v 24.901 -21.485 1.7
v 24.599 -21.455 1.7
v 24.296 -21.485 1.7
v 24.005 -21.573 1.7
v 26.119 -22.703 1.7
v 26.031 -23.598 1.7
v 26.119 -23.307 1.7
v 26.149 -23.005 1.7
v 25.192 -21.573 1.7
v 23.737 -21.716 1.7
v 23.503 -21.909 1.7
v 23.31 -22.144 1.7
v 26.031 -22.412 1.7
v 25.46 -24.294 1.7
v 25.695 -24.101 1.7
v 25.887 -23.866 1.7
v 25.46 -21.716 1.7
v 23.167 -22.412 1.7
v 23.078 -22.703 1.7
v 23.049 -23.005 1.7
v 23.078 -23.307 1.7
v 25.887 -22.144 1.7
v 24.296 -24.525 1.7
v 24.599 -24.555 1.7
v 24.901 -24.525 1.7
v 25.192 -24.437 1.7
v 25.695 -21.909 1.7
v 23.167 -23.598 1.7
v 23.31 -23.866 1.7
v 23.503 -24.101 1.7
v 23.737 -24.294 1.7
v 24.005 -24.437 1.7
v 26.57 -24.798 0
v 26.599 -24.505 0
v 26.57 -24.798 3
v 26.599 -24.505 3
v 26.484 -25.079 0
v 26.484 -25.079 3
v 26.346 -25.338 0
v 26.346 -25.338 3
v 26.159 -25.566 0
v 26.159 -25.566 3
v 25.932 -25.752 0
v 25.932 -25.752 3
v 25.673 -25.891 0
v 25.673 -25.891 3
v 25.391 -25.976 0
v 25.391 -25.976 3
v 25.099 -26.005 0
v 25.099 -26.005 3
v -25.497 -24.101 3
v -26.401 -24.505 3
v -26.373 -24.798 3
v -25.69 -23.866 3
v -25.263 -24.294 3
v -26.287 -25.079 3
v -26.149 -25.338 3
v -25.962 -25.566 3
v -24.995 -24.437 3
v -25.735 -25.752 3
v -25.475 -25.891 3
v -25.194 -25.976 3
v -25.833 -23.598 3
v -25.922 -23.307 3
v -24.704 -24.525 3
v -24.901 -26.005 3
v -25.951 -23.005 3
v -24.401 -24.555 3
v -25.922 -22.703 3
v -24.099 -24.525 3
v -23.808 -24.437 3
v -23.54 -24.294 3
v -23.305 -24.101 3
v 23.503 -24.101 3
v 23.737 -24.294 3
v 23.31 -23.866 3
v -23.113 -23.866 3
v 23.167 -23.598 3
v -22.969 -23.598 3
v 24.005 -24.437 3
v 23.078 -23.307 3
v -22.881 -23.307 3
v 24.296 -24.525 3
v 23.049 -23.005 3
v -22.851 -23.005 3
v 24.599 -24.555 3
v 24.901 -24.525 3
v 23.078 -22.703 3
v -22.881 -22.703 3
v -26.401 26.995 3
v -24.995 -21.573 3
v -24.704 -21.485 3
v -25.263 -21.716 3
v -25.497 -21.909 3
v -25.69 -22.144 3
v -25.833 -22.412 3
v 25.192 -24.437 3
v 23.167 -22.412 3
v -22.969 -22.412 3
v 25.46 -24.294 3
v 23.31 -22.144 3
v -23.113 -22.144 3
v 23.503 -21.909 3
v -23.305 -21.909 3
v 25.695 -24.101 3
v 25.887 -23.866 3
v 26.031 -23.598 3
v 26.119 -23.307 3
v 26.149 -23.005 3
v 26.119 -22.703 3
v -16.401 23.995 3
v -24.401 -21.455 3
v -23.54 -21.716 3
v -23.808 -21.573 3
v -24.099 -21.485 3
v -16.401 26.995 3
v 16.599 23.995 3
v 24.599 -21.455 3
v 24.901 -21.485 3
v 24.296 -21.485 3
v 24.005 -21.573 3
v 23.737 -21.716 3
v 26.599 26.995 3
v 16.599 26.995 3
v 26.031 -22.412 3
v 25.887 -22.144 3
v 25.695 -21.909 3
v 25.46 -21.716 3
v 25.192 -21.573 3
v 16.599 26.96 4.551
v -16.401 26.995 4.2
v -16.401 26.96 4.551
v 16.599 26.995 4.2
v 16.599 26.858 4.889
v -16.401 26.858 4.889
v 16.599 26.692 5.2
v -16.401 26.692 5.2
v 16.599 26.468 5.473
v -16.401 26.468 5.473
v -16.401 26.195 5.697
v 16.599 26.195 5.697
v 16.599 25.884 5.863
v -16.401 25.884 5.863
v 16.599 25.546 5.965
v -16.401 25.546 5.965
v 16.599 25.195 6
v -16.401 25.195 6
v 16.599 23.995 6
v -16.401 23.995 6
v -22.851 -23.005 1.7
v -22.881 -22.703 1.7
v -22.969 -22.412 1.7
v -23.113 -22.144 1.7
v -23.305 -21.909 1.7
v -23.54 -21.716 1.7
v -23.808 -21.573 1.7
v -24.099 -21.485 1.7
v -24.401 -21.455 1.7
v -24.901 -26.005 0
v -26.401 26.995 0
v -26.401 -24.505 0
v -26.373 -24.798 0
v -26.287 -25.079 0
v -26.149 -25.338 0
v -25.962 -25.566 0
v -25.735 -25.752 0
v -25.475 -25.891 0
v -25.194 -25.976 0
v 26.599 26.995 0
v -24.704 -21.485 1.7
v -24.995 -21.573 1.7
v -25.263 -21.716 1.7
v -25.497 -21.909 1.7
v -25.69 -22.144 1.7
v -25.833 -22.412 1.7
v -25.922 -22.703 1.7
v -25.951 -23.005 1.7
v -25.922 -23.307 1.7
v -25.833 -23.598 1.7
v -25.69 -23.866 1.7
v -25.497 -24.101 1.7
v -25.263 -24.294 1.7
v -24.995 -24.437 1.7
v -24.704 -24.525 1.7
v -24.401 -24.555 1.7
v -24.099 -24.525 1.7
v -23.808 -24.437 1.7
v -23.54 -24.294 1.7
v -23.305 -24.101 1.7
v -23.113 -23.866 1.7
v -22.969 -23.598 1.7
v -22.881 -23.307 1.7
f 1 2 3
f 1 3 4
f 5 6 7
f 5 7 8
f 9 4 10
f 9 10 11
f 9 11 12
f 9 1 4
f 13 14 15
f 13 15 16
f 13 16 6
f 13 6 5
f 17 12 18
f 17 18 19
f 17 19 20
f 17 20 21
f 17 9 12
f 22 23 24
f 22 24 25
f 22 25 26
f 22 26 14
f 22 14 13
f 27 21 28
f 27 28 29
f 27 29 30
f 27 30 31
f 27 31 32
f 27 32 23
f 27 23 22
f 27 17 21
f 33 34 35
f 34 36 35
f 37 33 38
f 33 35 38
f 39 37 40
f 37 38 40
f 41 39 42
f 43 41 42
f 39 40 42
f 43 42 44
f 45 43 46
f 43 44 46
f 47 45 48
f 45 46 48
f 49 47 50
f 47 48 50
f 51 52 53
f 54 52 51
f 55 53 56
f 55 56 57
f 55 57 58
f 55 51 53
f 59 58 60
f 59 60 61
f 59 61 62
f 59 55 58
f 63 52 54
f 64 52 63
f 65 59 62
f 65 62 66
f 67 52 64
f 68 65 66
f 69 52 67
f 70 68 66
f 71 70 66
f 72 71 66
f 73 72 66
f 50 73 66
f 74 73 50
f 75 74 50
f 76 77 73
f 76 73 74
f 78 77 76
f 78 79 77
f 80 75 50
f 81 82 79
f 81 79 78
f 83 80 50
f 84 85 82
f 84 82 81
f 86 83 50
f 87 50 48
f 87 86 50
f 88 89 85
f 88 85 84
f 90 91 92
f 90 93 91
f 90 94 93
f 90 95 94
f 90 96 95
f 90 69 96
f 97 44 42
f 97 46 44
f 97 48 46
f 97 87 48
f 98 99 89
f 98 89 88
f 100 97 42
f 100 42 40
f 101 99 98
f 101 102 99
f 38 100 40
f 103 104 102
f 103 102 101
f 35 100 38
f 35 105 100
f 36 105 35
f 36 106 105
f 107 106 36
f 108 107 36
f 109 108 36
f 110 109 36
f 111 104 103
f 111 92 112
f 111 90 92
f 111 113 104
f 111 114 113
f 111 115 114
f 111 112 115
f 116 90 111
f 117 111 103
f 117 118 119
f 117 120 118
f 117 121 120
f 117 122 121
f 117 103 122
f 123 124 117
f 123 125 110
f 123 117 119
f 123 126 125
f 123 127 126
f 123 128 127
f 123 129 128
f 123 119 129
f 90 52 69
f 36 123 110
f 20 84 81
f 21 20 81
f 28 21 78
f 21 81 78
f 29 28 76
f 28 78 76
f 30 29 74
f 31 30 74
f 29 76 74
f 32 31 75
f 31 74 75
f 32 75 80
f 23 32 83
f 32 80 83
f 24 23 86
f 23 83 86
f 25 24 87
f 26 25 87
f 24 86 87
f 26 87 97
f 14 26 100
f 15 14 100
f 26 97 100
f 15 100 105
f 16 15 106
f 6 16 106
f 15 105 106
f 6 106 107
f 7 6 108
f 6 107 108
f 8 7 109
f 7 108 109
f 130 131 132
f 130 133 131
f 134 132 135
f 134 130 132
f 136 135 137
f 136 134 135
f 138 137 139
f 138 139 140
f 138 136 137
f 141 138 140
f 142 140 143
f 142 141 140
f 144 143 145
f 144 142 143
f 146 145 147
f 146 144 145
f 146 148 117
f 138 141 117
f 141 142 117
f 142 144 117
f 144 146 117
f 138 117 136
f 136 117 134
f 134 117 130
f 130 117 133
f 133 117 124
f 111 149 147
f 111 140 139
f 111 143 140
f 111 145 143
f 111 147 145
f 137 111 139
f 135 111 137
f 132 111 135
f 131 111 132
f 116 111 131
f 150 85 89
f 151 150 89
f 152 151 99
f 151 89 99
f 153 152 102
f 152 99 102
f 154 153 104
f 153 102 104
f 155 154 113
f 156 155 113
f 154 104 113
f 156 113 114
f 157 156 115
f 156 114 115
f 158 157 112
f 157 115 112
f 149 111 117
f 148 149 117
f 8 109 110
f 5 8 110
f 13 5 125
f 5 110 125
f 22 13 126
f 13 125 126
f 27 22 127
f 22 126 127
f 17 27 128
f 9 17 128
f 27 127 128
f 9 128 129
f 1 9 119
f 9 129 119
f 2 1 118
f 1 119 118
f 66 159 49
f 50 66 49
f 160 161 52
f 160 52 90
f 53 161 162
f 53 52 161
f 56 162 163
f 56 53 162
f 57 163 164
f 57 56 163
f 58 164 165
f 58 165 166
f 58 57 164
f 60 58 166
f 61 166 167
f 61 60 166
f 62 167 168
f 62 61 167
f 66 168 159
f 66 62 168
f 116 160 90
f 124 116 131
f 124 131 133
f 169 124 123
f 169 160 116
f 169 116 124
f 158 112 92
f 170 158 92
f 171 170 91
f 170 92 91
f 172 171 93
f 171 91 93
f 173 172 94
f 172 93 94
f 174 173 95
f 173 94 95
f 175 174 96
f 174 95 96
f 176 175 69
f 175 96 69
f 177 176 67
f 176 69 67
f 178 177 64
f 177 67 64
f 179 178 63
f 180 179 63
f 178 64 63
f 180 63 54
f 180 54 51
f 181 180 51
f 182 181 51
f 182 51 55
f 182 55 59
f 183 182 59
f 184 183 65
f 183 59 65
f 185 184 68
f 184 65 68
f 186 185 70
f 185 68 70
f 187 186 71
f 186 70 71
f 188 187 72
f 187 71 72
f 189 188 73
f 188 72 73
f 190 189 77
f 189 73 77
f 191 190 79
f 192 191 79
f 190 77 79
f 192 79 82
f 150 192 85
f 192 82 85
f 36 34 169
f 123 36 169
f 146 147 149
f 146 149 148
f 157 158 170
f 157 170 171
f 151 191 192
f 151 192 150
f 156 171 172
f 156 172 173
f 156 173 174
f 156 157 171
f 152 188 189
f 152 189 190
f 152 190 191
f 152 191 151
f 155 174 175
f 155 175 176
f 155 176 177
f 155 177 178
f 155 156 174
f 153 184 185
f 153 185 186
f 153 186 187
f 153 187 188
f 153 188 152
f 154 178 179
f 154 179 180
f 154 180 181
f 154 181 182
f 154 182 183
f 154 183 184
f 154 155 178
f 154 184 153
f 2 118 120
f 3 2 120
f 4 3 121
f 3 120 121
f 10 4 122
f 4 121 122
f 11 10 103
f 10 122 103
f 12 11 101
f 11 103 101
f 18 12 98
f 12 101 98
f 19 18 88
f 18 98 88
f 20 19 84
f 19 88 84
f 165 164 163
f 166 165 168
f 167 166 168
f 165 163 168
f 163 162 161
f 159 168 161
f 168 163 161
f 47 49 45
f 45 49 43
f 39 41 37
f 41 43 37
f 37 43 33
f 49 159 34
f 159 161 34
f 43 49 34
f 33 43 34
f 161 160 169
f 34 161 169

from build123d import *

# Parameters (mm, degrees)
F0_W     = 53
F0_H     = 53
F1_DEPTH = 3
F3_DEPTH = 1.3
F4_W     = 33
F4_H     = 3
F5_DEPTH = 3
F6_R     = 1.8
F7_R     = 1.5


with BuildPart() as f1:
    # F0 (on Top) → F1 (new body)
    with BuildSketch(Plane.XY):
        with Locations((0.098538, 0.495021)):
            Rectangle(F0_W, F0_H)
    extrude(amount=F1_DEPTH)

    # F2 (on face) → F3 (cut)
    with BuildSketch(Plane.XY.offset(3)):
        with BuildLine():
            Line((-24.401462, -23.004979), (-24.401462, -21.454979))
            ThreePointArc((-24.401462, -21.454979), (-25.497478, -24.100995), (-22.851462, -23.004979))
            Line((-22.851462, -23.004979), (-24.401462, -23.004979))
        make_face()
        with BuildLine():
            ThreePointArc((26.148538, -23.004979), (25.694553, -21.908964), (24.598538, -21.454979))
            Line((24.598538, -21.454979), (24.598538, -23.004979))
            Line((24.598538, -23.004979), (23.048538, -23.004979))
            ThreePointArc((23.048538, -23.004979), (24.598538, -24.554979), (26.148538, -23.004979))
        make_face()
        with BuildLine():
            Line((24.598538, -23.004979), (24.598538, -21.454979))
            ThreePointArc((24.598538, -21.454979), (23.502522, -21.908964), (23.048538, -23.004979))
            Line((23.048538, -23.004979), (24.598538, -23.004979))
        make_face()
        with BuildLine():
            ThreePointArc((-22.851462, -23.004979), (-23.305447, -21.908964), (-24.401462, -21.454979))
            Line((-24.401462, -21.454979), (-24.401462, -23.004979))
            Line((-24.401462, -23.004979), (-22.851462, -23.004979))
        make_face()
    extrude(amount=-F3_DEPTH, mode=Mode.SUBTRACT)

    # F4 (on face) → F5 (join)
    with BuildSketch(Plane.XY.offset(3)):
        with Locations((0.098538, 25.495021)):
            Rectangle(F4_W, F4_H)
    extrude(amount=F5_DEPTH)

    # F6
    f6_edges = [f1.edges().sort_by_distance(p)[0] for p in [
        (0.098538, 26.995021, 6),
    ]]
    fillet(f6_edges, radius=F6_R)

    # F7
    f7_edges = [f1.edges().sort_by_distance(p)[0] for p in [
        (26.598538, -26.004979, 1.5),
        (-26.401462, -26.004979, 1.5),
    ]]
    fillet(f7_edges, radius=F7_R)


solid = f1.part
